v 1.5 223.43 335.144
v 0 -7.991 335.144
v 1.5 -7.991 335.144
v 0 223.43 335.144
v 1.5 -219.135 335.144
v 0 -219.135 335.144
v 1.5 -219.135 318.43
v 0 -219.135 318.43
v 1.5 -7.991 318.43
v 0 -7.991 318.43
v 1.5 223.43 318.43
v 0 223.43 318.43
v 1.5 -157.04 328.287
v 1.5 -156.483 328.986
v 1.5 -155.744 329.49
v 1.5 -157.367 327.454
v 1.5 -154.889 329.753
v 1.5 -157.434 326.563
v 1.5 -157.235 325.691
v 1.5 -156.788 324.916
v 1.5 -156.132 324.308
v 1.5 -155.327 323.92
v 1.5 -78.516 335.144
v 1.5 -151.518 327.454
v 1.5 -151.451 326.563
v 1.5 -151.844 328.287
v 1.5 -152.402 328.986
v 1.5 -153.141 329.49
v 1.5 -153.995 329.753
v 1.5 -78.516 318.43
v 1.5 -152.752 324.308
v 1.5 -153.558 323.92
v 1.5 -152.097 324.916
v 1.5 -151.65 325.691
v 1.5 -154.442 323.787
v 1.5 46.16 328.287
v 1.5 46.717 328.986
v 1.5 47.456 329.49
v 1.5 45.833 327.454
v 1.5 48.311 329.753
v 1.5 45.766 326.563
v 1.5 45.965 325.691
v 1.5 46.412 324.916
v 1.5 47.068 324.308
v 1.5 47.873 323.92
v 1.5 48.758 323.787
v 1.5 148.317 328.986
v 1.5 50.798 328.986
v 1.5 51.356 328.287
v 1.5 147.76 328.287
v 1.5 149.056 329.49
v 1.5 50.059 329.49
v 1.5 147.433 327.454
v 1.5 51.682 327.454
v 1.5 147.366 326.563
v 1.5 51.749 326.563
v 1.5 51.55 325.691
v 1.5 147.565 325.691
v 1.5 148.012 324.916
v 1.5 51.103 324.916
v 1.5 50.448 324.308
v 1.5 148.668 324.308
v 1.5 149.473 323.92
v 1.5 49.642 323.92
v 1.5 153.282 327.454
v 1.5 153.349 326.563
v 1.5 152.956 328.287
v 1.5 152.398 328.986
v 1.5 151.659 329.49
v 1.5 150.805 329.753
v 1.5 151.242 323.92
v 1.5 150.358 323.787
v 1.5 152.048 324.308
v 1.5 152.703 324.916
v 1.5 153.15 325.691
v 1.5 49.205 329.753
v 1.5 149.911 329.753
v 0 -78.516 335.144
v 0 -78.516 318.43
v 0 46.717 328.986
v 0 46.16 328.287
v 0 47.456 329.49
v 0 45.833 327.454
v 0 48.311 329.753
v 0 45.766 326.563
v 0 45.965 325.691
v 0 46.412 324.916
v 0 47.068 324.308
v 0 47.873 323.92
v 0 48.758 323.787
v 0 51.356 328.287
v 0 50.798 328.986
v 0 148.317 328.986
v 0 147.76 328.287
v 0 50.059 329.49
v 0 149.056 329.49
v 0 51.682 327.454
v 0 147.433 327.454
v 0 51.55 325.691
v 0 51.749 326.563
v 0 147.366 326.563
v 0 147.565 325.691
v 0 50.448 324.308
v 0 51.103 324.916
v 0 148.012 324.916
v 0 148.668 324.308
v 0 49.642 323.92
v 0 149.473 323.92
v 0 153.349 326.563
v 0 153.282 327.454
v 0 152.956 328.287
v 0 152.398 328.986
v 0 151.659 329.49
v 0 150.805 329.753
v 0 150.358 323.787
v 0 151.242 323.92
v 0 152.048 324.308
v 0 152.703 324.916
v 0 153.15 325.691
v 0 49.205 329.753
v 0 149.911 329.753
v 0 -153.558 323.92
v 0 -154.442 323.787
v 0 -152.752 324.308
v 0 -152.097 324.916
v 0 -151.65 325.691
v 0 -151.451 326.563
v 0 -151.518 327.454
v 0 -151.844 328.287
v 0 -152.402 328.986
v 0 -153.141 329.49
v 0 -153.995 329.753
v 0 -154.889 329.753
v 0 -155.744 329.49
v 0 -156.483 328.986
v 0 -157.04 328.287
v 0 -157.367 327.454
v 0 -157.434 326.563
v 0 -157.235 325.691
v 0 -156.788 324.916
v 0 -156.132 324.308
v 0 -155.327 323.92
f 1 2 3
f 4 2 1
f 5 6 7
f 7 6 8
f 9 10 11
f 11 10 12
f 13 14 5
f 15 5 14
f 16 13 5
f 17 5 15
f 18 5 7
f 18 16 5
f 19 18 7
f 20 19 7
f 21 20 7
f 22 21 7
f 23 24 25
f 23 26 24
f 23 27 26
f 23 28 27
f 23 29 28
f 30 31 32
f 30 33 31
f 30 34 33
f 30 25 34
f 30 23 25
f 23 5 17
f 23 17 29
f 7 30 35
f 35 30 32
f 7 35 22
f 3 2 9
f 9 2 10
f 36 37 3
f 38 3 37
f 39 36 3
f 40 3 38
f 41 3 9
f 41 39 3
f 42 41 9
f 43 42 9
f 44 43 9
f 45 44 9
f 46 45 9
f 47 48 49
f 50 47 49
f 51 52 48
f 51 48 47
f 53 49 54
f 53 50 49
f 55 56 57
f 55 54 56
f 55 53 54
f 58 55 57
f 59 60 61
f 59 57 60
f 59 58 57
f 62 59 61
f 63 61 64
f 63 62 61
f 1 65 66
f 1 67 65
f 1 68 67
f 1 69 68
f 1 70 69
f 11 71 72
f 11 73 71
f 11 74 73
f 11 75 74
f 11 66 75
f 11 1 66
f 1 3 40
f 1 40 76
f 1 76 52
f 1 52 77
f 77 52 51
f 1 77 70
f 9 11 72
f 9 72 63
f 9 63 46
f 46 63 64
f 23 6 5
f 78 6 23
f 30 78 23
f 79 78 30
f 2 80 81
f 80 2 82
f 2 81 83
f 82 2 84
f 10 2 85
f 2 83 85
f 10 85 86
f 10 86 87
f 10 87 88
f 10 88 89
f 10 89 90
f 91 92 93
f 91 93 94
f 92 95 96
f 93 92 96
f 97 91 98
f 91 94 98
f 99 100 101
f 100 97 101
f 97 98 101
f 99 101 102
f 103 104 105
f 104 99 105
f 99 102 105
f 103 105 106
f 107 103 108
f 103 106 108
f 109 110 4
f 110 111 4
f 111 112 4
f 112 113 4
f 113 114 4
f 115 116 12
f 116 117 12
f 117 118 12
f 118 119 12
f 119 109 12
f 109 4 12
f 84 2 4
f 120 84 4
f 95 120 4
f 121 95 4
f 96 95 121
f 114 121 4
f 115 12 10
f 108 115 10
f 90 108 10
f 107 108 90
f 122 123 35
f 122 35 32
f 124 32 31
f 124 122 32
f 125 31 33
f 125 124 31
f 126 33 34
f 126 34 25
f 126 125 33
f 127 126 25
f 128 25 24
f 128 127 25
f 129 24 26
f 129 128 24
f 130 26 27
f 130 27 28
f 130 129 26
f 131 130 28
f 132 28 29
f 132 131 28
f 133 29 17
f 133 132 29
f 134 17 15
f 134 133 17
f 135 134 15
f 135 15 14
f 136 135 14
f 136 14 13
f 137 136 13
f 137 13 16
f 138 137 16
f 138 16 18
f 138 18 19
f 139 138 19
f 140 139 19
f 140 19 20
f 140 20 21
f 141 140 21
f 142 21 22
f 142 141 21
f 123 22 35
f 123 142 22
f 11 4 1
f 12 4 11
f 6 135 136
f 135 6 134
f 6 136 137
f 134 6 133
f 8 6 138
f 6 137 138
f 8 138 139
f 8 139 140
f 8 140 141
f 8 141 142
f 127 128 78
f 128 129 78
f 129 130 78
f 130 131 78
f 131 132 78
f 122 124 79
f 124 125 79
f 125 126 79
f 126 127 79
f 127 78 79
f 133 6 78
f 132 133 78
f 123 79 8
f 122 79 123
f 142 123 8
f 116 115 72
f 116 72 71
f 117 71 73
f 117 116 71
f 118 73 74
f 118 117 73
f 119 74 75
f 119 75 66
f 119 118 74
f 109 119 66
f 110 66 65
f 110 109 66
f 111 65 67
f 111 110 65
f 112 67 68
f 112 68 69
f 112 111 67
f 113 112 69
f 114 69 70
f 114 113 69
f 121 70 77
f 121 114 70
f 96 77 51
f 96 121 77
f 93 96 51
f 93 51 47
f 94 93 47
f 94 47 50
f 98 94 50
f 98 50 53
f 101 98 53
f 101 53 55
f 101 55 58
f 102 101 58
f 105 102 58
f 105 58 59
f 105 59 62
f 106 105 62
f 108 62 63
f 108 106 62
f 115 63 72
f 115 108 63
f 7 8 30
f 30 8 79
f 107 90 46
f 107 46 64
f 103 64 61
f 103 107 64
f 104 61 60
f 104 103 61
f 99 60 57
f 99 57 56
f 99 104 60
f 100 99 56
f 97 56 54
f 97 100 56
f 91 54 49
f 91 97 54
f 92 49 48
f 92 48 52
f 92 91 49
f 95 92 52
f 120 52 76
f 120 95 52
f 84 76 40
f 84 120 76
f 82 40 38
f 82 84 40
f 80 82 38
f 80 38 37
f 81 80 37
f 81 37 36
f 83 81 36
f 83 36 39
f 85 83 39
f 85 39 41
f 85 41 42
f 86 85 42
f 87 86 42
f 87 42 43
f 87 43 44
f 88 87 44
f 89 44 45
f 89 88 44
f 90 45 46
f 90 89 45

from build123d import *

# Parameters (mm, degrees)
SKETCH1_W             = 16.714
SKETCH1_H             = 140.619093265
SKETCH1_R             = 3
BOSS_EXTRUDE1_DEPTH   = 1.5
SKETCH1_H_2           = 231.421093249
BOSS_EXTRUDE1_2_DEPTH = 1.5


with BuildPart() as part:
    # Sketch1 → Boss-Extrude1 (new body)
    with BuildSketch(Plane(origin=(0, 0, 0), x_dir=(0, 0, -1), z_dir=(1, 0, 0))):
        with Locations((-326.786752095, -148.825397991)):
            Rectangle(SKETCH1_W, SKETCH1_H)
        with Locations((-326.786752095, -154.442358109)):
            Circle(SKETCH1_R, mode=Mode.SUBTRACT)
    extrude(amount=BOSS_EXTRUDE1_DEPTH)


with BuildPart() as body_2:
    # Sketch1 → Boss-Extrude1 2 (new body)
    with BuildSketch(Plane(origin=(0, 0, 0), x_dir=(0, 0, -1), z_dir=(1, 0, 0))):
        with Locations((-326.786752095, 107.719695266)):
            Rectangle(SKETCH1_W, SKETCH1_H_2)
        with Locations((-326.786752095, 150.357641891)):
            Circle(SKETCH1_R, mode=Mode.SUBTRACT)
        with Locations((-326.786752095, 48.757641891)):
            Circle(SKETCH1_R, mode=Mode.SUBTRACT)
    extrude(amount=BOSS_EXTRUDE1_2_DEPTH)


solid = Compound([part.part, body_2.part])
